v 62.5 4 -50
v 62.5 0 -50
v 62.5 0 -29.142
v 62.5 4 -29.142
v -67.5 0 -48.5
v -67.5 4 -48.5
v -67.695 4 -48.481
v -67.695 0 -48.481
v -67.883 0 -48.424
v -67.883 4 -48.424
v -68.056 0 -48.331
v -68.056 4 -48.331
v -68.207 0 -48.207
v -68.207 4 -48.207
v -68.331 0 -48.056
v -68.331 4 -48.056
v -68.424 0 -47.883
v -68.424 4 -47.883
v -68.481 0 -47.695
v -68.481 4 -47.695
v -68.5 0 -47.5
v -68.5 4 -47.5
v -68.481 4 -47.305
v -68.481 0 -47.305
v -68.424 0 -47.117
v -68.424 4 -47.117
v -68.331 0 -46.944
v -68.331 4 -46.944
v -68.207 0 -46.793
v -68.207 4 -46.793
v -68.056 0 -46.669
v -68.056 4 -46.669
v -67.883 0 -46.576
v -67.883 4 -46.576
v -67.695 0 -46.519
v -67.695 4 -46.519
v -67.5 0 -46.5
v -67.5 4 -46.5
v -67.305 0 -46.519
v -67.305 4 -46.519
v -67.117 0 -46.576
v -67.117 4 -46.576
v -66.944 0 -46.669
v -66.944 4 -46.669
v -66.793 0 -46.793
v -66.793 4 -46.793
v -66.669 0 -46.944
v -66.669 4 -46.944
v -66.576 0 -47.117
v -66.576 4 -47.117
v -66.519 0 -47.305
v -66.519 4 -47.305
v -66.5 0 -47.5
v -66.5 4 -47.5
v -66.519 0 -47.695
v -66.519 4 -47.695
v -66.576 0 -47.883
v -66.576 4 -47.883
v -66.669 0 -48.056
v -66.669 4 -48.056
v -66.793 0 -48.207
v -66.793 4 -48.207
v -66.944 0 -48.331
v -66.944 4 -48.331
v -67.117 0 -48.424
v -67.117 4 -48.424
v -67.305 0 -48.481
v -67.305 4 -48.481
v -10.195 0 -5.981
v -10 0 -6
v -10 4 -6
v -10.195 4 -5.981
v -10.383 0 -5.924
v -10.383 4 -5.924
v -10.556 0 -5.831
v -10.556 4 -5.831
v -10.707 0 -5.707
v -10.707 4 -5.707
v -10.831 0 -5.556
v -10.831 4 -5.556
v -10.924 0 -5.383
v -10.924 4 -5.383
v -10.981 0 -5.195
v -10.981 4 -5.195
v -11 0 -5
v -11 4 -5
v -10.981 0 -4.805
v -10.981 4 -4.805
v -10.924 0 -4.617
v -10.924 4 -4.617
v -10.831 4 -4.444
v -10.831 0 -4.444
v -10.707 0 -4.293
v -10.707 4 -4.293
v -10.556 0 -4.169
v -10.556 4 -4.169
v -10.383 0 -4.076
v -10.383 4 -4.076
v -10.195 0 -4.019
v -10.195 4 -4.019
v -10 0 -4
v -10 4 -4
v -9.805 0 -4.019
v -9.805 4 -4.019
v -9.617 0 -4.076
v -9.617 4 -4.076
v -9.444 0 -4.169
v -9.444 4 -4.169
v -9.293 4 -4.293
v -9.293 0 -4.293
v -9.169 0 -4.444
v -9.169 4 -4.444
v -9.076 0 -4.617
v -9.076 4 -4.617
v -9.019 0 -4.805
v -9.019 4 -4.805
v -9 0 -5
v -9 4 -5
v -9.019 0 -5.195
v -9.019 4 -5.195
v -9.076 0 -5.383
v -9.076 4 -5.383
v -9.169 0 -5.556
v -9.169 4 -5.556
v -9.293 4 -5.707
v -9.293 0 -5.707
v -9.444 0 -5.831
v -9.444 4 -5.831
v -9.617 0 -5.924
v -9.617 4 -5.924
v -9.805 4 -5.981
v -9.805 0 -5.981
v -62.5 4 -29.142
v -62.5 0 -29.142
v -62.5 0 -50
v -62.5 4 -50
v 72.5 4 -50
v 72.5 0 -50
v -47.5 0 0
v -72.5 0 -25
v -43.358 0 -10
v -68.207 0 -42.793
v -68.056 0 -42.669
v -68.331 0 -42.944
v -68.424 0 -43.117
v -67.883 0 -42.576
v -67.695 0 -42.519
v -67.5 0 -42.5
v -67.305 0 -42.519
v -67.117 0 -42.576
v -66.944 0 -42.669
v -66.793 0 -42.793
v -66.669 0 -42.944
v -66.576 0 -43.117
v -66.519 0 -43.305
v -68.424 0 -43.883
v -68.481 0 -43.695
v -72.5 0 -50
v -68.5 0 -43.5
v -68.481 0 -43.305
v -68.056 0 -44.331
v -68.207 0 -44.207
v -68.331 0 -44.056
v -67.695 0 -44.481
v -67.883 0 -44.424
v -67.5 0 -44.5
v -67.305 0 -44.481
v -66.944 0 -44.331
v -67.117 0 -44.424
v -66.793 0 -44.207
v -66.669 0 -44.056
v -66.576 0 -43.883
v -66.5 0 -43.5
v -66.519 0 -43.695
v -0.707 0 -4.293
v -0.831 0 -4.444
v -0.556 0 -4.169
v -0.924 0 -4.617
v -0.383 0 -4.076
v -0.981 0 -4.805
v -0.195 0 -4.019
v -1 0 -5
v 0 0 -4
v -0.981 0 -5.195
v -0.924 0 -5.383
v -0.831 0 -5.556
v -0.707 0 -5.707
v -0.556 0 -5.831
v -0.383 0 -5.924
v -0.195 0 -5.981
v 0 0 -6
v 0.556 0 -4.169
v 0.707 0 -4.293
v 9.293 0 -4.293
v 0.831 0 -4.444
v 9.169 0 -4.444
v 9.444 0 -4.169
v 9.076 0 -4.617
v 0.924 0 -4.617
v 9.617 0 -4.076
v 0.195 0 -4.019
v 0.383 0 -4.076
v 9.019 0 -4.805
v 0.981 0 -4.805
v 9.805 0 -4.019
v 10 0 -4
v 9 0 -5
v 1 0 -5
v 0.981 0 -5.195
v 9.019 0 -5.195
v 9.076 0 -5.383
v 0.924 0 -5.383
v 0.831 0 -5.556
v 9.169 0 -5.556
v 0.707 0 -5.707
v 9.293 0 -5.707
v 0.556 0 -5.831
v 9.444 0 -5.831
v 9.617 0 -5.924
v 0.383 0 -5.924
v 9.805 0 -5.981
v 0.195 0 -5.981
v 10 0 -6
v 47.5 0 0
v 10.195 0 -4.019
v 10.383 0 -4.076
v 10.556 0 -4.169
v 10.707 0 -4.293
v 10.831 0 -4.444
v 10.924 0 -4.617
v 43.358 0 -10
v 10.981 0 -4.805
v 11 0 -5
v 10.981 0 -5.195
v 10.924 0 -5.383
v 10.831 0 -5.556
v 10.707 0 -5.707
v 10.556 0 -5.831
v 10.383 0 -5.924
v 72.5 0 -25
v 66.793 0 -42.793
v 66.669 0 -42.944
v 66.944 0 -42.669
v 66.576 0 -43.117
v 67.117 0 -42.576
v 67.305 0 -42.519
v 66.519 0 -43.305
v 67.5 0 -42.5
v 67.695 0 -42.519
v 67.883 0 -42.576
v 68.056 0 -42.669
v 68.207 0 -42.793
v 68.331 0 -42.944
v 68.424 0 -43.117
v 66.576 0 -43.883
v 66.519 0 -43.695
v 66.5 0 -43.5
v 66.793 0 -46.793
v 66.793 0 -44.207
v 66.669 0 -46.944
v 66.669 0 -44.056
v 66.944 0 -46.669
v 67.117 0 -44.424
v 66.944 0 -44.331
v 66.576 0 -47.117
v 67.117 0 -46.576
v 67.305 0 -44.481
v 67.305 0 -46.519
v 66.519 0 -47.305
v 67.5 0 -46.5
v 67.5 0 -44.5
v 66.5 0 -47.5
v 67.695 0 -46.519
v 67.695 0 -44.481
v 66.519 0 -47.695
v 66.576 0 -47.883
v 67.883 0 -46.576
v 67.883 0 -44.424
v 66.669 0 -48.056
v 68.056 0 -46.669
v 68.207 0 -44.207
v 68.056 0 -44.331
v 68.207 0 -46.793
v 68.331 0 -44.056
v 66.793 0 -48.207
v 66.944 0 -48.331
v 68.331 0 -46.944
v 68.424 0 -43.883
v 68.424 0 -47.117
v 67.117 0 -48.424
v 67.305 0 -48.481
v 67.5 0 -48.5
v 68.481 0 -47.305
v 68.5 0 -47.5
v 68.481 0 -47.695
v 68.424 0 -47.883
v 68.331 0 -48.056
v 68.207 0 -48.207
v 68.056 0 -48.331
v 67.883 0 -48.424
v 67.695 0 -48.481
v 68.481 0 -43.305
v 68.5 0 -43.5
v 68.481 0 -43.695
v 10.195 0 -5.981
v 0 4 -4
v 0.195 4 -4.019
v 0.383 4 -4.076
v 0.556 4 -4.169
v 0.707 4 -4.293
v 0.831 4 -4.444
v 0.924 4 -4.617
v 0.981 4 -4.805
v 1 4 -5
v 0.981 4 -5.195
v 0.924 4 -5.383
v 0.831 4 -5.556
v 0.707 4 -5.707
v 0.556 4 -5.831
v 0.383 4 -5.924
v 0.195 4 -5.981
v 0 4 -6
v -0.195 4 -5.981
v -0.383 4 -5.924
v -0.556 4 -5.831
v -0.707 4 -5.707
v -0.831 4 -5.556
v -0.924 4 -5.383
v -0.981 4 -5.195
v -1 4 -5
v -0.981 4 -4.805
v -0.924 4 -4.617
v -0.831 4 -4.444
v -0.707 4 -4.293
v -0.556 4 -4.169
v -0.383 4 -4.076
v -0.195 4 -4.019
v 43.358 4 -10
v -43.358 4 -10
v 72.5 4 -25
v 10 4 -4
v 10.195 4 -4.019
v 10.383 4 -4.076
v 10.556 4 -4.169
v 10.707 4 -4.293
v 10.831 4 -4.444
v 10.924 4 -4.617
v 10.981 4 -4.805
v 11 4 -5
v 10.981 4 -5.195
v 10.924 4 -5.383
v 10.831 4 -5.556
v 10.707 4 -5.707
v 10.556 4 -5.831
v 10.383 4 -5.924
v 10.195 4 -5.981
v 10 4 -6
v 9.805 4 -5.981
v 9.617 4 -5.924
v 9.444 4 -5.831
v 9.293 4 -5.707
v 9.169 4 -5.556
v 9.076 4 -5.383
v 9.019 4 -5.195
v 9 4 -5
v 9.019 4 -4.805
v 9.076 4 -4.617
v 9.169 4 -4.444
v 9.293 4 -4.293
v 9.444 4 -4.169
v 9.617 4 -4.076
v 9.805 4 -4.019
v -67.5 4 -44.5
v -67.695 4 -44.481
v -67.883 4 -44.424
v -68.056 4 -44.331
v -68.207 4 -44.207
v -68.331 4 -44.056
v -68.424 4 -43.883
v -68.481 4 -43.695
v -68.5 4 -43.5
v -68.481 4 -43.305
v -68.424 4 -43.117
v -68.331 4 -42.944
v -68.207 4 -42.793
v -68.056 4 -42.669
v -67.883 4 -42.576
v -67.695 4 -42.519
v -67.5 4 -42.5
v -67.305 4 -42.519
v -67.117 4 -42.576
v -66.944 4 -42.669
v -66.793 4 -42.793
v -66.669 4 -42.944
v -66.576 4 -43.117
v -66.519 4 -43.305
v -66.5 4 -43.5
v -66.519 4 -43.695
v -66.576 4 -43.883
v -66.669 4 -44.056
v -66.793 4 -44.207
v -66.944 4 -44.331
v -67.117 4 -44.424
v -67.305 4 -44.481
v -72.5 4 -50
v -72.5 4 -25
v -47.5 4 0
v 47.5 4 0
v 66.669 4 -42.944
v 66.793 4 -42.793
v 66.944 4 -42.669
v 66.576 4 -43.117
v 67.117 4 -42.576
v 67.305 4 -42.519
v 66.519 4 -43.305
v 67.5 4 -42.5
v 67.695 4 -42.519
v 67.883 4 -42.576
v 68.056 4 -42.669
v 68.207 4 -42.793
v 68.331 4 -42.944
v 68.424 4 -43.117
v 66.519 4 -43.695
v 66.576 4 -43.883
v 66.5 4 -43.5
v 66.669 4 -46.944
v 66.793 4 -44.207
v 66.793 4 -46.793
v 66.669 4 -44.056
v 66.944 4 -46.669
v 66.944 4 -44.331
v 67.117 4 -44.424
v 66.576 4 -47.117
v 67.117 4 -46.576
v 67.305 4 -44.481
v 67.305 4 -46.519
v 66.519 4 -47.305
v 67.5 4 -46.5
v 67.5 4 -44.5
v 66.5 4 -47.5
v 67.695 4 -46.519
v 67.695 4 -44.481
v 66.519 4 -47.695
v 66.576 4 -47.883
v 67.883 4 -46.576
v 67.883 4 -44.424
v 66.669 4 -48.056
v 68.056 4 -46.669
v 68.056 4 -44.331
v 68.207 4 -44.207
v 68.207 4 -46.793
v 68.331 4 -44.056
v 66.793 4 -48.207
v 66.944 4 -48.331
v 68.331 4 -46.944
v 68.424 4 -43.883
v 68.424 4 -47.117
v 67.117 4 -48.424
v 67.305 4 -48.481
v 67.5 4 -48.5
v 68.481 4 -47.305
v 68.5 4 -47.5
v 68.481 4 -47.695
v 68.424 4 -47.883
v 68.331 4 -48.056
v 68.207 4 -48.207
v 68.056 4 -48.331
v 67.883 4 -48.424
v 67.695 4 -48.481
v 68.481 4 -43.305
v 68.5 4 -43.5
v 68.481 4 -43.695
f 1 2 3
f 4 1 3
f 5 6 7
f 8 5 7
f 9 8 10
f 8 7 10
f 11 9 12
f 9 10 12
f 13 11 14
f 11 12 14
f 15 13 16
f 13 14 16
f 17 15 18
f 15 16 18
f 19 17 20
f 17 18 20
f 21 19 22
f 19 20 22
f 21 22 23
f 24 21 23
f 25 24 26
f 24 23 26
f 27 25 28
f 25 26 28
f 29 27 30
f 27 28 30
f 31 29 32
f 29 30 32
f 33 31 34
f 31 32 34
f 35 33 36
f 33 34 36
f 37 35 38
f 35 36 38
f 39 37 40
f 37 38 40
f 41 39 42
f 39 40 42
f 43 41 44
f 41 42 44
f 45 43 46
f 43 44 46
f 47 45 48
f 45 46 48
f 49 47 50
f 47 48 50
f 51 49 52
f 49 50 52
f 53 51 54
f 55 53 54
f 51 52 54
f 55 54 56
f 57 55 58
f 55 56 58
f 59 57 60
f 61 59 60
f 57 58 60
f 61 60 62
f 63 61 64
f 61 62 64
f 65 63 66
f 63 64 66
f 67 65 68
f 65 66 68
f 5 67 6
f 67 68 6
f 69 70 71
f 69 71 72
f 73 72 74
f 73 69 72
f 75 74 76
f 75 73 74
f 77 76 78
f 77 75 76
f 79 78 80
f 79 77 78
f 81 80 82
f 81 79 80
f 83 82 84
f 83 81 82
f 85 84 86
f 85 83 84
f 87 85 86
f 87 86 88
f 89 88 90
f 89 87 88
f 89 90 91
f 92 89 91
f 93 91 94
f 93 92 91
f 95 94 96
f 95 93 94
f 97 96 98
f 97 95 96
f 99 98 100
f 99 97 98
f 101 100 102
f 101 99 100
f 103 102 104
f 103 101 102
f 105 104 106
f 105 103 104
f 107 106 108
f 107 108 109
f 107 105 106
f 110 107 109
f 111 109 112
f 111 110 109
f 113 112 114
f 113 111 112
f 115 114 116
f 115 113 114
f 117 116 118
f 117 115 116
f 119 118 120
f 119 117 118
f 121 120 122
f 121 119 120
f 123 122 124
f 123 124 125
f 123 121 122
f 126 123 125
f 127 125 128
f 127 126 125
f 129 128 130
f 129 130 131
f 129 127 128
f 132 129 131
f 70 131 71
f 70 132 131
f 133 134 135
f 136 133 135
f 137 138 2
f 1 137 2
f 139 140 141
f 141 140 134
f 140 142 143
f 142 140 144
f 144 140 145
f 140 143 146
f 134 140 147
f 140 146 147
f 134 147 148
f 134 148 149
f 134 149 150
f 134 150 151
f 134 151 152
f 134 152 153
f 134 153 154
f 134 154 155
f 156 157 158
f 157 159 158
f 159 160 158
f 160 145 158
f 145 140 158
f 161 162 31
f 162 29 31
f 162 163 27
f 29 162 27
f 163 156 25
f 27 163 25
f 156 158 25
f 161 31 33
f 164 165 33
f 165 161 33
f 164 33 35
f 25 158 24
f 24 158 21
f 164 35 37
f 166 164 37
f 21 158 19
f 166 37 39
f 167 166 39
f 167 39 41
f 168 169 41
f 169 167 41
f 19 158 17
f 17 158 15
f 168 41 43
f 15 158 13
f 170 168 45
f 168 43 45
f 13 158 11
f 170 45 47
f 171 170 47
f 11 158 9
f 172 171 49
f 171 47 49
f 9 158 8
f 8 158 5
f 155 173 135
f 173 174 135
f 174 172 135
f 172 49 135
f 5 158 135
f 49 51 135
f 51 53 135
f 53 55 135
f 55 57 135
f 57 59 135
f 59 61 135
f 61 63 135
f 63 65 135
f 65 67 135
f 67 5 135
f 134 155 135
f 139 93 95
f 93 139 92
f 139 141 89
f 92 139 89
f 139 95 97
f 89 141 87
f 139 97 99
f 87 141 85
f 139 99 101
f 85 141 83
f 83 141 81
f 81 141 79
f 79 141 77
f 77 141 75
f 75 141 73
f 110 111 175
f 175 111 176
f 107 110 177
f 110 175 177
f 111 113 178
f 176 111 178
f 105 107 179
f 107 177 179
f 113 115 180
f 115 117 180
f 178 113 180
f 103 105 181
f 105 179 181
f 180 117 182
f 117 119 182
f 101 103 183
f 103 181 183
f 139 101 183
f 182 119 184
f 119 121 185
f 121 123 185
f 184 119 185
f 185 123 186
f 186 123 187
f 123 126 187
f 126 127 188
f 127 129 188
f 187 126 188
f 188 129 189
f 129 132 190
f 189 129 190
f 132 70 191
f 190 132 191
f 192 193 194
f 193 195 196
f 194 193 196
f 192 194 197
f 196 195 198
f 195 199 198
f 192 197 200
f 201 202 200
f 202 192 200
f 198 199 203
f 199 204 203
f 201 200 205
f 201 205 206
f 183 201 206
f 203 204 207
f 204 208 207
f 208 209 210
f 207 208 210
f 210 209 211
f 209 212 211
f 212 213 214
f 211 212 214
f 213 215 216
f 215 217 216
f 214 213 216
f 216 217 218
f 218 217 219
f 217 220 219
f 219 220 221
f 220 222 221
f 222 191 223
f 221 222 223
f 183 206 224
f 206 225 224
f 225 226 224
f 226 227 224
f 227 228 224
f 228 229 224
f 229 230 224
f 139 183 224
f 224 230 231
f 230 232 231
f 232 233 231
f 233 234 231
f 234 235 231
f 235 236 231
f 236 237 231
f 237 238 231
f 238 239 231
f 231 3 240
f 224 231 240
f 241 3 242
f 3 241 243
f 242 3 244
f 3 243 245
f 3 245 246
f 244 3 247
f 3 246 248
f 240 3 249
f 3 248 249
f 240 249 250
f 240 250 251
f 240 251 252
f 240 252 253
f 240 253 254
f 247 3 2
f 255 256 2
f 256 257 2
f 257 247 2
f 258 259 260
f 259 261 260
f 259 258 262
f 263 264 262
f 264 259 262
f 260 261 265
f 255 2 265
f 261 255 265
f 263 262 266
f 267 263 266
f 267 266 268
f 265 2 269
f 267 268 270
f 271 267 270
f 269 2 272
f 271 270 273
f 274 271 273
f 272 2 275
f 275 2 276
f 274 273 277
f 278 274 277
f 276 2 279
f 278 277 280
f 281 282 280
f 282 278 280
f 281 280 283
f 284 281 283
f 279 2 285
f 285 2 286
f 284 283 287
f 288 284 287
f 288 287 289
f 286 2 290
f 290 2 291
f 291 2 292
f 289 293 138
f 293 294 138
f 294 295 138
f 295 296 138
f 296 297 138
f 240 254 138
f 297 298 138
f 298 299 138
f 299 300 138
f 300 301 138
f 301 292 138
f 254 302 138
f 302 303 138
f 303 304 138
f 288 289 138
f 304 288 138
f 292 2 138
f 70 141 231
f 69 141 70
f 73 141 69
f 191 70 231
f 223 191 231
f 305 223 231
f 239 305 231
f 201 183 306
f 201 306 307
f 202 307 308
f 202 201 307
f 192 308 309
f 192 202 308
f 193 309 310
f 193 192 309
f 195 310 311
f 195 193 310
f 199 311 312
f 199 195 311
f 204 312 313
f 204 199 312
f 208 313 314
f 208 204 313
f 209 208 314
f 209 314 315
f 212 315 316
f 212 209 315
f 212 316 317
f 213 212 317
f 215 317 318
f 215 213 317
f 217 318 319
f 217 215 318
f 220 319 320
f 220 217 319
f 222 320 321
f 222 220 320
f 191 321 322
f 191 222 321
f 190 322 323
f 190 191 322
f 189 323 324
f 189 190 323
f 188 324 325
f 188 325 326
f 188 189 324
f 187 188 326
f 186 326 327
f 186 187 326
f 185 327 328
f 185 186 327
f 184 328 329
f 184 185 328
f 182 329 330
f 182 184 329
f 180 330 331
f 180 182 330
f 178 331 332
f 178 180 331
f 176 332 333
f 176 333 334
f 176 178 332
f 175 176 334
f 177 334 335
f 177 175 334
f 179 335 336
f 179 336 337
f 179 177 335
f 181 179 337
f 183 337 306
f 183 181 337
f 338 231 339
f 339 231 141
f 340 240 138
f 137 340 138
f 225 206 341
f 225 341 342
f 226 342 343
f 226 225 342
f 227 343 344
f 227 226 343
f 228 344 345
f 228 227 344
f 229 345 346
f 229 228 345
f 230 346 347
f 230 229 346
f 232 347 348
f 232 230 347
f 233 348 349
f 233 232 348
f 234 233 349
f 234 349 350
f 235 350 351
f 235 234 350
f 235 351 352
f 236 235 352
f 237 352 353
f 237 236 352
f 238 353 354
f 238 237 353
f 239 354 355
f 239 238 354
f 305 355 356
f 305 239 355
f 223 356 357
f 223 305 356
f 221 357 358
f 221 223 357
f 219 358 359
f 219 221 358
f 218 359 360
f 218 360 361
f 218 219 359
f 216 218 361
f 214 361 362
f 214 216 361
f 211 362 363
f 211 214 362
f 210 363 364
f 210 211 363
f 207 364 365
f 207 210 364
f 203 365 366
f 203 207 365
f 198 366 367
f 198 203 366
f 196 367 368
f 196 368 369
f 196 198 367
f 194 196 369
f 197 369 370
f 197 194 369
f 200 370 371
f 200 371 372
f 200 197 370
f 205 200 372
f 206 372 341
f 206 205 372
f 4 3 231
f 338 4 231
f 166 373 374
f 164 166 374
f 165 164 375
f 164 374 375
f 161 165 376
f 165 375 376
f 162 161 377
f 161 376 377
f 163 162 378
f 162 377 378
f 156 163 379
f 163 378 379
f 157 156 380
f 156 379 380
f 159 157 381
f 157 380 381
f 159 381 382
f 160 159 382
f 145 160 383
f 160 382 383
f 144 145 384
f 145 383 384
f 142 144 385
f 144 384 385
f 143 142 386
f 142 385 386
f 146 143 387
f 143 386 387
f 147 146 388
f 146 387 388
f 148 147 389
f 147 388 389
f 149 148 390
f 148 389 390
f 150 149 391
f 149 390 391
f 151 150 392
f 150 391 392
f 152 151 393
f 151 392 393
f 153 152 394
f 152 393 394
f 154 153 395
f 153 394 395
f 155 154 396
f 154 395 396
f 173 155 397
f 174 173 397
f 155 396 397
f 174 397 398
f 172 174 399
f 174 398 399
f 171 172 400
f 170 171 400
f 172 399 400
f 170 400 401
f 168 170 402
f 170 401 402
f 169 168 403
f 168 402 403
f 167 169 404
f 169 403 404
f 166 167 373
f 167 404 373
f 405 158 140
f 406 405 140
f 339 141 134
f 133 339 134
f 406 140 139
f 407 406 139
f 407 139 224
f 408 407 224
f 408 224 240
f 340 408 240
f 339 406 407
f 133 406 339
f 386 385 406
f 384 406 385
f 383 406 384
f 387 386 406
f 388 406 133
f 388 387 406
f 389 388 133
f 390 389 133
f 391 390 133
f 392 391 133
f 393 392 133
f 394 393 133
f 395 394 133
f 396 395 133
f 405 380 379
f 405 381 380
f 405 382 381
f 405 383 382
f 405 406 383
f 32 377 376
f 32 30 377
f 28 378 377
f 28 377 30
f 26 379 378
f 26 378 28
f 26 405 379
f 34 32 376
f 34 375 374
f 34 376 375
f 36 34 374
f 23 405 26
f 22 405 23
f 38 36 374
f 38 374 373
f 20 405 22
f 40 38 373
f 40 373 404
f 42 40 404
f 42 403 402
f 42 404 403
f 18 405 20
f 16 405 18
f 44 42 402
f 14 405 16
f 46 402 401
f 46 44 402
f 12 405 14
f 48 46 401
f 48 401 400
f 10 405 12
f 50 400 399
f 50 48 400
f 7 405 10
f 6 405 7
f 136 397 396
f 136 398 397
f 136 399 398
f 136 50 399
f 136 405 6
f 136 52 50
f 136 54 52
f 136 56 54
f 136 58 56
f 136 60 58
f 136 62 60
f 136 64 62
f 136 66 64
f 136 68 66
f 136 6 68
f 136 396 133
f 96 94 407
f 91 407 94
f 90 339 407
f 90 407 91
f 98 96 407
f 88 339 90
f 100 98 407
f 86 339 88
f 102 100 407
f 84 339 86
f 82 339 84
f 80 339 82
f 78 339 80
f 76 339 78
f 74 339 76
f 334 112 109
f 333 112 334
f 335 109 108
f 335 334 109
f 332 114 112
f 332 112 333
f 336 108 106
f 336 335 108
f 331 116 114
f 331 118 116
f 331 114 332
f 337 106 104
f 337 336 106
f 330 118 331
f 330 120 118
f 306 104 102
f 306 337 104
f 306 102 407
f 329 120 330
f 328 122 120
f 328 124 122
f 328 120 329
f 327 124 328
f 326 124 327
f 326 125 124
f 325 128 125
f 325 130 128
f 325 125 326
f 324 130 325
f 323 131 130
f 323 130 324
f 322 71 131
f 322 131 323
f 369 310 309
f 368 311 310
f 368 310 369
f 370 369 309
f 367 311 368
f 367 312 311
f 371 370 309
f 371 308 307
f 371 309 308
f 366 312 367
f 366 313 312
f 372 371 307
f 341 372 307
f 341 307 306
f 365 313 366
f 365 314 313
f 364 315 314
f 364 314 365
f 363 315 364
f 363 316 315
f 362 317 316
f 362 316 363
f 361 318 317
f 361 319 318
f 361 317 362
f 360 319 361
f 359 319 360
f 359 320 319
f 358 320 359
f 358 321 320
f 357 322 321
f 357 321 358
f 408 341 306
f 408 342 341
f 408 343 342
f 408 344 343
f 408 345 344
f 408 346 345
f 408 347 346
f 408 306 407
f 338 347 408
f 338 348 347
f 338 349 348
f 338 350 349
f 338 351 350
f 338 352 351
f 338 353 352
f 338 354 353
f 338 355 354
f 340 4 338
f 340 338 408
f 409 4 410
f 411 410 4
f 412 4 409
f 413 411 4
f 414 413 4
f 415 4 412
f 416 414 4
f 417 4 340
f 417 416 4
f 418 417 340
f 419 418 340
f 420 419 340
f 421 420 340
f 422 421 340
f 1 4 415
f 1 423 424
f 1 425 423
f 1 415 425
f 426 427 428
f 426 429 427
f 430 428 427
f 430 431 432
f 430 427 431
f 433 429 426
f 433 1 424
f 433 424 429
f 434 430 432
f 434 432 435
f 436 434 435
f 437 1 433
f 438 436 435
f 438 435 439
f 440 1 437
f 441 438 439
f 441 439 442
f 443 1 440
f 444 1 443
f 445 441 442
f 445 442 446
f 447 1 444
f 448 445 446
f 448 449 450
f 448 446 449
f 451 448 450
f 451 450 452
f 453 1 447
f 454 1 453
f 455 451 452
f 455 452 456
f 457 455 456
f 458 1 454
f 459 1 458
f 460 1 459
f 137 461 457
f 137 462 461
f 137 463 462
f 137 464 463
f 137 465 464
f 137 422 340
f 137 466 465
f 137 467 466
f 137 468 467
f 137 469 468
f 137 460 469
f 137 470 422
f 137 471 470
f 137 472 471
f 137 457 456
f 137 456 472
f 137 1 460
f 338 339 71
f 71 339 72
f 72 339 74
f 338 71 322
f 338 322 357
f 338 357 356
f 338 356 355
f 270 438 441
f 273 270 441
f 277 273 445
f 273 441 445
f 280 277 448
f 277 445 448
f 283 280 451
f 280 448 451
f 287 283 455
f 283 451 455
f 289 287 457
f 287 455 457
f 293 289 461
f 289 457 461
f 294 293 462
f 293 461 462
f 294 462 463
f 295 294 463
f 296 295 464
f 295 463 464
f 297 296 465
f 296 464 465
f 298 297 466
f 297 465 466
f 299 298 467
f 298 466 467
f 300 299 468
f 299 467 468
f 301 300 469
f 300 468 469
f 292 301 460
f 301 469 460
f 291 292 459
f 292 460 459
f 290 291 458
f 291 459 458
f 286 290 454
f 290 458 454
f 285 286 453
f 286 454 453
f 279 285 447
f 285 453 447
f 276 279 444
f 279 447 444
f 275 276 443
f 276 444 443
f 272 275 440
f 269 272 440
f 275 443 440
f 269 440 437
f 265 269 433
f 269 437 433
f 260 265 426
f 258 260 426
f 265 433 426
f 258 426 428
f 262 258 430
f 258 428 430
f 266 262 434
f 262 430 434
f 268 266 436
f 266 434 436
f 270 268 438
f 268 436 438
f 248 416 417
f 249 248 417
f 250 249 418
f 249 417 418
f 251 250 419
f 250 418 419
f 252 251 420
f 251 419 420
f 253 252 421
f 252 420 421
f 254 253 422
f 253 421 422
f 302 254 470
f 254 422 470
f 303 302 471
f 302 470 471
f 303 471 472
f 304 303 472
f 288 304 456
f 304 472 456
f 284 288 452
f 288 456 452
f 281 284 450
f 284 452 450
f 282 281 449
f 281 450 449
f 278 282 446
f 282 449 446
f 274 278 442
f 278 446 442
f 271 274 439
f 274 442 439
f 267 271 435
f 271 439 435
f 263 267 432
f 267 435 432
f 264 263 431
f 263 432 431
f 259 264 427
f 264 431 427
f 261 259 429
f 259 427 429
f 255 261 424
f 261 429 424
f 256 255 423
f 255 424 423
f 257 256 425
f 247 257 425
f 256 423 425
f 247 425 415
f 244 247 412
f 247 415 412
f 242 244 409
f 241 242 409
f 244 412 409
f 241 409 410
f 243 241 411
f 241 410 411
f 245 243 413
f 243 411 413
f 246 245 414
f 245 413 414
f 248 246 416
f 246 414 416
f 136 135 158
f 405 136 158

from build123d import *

# Parameters (mm, degrees)
SKETCH1_R           = 1
BOSS_EXTRUDE1_DEPTH = 4
SKETCH2_R           = 1
CUT_EXTRUDE1_DEPTH  = 4


with BuildPart() as part:
    # Sketch1 → Boss-Extrude1 (new body)
    with BuildSketch(Plane(origin=(0, 0, 0), x_dir=(1, 0, 0), z_dir=(0, 1, 0))):
        Polygon((0, 0), (47.5, 0), (72.5, 25), (72.5, 50), (62.5, 50), (62.5, 29.142135624), (43.357864376, 10), (0, 10), (-43.357864376, 10), (-62.5, 29.142135624), (-62.5, 50), (-72.5, 50), (-72.5, 25), (-47.5, 0), align=None)
        with Locations(Location((10, 5, 0), (0, 0, 270))):
            Circle(SKETCH1_R, mode=Mode.SUBTRACT)
        with Locations(Location((0, 5, 0), (0, 0, 270))):
            Circle(SKETCH1_R, mode=Mode.SUBTRACT)
        with Locations(Location((-10, 5, 0), (0, 0, 90))):
            Circle(SKETCH1_R, mode=Mode.SUBTRACT)
    extrude(amount=BOSS_EXTRUDE1_DEPTH)

    # Sketch2 → Cut-Extrude1 (cut)
    with BuildSketch(Plane(origin=(0, 4, 0), x_dir=(1, 0, 0), z_dir=(0, 1, 0))):
        with Locations(Location((67.5, 47.5, 0), (0, 0, 270))):
            Circle(SKETCH2_R)
        with Locations(Location((67.5, 43.5, 0), (0, 0, 270))):
            Circle(SKETCH2_R)
        with Locations(Location((-67.5, 43.5, 0), (0, 0, 90))):
            Circle(SKETCH2_R)
        with Locations(Location((-67.5, 47.5, 0), (0, 0, 90))):
            Circle(SKETCH2_R)
    extrude(amount=-CUT_EXTRUDE1_DEPTH, mode=Mode.SUBTRACT)


solid = part.part
